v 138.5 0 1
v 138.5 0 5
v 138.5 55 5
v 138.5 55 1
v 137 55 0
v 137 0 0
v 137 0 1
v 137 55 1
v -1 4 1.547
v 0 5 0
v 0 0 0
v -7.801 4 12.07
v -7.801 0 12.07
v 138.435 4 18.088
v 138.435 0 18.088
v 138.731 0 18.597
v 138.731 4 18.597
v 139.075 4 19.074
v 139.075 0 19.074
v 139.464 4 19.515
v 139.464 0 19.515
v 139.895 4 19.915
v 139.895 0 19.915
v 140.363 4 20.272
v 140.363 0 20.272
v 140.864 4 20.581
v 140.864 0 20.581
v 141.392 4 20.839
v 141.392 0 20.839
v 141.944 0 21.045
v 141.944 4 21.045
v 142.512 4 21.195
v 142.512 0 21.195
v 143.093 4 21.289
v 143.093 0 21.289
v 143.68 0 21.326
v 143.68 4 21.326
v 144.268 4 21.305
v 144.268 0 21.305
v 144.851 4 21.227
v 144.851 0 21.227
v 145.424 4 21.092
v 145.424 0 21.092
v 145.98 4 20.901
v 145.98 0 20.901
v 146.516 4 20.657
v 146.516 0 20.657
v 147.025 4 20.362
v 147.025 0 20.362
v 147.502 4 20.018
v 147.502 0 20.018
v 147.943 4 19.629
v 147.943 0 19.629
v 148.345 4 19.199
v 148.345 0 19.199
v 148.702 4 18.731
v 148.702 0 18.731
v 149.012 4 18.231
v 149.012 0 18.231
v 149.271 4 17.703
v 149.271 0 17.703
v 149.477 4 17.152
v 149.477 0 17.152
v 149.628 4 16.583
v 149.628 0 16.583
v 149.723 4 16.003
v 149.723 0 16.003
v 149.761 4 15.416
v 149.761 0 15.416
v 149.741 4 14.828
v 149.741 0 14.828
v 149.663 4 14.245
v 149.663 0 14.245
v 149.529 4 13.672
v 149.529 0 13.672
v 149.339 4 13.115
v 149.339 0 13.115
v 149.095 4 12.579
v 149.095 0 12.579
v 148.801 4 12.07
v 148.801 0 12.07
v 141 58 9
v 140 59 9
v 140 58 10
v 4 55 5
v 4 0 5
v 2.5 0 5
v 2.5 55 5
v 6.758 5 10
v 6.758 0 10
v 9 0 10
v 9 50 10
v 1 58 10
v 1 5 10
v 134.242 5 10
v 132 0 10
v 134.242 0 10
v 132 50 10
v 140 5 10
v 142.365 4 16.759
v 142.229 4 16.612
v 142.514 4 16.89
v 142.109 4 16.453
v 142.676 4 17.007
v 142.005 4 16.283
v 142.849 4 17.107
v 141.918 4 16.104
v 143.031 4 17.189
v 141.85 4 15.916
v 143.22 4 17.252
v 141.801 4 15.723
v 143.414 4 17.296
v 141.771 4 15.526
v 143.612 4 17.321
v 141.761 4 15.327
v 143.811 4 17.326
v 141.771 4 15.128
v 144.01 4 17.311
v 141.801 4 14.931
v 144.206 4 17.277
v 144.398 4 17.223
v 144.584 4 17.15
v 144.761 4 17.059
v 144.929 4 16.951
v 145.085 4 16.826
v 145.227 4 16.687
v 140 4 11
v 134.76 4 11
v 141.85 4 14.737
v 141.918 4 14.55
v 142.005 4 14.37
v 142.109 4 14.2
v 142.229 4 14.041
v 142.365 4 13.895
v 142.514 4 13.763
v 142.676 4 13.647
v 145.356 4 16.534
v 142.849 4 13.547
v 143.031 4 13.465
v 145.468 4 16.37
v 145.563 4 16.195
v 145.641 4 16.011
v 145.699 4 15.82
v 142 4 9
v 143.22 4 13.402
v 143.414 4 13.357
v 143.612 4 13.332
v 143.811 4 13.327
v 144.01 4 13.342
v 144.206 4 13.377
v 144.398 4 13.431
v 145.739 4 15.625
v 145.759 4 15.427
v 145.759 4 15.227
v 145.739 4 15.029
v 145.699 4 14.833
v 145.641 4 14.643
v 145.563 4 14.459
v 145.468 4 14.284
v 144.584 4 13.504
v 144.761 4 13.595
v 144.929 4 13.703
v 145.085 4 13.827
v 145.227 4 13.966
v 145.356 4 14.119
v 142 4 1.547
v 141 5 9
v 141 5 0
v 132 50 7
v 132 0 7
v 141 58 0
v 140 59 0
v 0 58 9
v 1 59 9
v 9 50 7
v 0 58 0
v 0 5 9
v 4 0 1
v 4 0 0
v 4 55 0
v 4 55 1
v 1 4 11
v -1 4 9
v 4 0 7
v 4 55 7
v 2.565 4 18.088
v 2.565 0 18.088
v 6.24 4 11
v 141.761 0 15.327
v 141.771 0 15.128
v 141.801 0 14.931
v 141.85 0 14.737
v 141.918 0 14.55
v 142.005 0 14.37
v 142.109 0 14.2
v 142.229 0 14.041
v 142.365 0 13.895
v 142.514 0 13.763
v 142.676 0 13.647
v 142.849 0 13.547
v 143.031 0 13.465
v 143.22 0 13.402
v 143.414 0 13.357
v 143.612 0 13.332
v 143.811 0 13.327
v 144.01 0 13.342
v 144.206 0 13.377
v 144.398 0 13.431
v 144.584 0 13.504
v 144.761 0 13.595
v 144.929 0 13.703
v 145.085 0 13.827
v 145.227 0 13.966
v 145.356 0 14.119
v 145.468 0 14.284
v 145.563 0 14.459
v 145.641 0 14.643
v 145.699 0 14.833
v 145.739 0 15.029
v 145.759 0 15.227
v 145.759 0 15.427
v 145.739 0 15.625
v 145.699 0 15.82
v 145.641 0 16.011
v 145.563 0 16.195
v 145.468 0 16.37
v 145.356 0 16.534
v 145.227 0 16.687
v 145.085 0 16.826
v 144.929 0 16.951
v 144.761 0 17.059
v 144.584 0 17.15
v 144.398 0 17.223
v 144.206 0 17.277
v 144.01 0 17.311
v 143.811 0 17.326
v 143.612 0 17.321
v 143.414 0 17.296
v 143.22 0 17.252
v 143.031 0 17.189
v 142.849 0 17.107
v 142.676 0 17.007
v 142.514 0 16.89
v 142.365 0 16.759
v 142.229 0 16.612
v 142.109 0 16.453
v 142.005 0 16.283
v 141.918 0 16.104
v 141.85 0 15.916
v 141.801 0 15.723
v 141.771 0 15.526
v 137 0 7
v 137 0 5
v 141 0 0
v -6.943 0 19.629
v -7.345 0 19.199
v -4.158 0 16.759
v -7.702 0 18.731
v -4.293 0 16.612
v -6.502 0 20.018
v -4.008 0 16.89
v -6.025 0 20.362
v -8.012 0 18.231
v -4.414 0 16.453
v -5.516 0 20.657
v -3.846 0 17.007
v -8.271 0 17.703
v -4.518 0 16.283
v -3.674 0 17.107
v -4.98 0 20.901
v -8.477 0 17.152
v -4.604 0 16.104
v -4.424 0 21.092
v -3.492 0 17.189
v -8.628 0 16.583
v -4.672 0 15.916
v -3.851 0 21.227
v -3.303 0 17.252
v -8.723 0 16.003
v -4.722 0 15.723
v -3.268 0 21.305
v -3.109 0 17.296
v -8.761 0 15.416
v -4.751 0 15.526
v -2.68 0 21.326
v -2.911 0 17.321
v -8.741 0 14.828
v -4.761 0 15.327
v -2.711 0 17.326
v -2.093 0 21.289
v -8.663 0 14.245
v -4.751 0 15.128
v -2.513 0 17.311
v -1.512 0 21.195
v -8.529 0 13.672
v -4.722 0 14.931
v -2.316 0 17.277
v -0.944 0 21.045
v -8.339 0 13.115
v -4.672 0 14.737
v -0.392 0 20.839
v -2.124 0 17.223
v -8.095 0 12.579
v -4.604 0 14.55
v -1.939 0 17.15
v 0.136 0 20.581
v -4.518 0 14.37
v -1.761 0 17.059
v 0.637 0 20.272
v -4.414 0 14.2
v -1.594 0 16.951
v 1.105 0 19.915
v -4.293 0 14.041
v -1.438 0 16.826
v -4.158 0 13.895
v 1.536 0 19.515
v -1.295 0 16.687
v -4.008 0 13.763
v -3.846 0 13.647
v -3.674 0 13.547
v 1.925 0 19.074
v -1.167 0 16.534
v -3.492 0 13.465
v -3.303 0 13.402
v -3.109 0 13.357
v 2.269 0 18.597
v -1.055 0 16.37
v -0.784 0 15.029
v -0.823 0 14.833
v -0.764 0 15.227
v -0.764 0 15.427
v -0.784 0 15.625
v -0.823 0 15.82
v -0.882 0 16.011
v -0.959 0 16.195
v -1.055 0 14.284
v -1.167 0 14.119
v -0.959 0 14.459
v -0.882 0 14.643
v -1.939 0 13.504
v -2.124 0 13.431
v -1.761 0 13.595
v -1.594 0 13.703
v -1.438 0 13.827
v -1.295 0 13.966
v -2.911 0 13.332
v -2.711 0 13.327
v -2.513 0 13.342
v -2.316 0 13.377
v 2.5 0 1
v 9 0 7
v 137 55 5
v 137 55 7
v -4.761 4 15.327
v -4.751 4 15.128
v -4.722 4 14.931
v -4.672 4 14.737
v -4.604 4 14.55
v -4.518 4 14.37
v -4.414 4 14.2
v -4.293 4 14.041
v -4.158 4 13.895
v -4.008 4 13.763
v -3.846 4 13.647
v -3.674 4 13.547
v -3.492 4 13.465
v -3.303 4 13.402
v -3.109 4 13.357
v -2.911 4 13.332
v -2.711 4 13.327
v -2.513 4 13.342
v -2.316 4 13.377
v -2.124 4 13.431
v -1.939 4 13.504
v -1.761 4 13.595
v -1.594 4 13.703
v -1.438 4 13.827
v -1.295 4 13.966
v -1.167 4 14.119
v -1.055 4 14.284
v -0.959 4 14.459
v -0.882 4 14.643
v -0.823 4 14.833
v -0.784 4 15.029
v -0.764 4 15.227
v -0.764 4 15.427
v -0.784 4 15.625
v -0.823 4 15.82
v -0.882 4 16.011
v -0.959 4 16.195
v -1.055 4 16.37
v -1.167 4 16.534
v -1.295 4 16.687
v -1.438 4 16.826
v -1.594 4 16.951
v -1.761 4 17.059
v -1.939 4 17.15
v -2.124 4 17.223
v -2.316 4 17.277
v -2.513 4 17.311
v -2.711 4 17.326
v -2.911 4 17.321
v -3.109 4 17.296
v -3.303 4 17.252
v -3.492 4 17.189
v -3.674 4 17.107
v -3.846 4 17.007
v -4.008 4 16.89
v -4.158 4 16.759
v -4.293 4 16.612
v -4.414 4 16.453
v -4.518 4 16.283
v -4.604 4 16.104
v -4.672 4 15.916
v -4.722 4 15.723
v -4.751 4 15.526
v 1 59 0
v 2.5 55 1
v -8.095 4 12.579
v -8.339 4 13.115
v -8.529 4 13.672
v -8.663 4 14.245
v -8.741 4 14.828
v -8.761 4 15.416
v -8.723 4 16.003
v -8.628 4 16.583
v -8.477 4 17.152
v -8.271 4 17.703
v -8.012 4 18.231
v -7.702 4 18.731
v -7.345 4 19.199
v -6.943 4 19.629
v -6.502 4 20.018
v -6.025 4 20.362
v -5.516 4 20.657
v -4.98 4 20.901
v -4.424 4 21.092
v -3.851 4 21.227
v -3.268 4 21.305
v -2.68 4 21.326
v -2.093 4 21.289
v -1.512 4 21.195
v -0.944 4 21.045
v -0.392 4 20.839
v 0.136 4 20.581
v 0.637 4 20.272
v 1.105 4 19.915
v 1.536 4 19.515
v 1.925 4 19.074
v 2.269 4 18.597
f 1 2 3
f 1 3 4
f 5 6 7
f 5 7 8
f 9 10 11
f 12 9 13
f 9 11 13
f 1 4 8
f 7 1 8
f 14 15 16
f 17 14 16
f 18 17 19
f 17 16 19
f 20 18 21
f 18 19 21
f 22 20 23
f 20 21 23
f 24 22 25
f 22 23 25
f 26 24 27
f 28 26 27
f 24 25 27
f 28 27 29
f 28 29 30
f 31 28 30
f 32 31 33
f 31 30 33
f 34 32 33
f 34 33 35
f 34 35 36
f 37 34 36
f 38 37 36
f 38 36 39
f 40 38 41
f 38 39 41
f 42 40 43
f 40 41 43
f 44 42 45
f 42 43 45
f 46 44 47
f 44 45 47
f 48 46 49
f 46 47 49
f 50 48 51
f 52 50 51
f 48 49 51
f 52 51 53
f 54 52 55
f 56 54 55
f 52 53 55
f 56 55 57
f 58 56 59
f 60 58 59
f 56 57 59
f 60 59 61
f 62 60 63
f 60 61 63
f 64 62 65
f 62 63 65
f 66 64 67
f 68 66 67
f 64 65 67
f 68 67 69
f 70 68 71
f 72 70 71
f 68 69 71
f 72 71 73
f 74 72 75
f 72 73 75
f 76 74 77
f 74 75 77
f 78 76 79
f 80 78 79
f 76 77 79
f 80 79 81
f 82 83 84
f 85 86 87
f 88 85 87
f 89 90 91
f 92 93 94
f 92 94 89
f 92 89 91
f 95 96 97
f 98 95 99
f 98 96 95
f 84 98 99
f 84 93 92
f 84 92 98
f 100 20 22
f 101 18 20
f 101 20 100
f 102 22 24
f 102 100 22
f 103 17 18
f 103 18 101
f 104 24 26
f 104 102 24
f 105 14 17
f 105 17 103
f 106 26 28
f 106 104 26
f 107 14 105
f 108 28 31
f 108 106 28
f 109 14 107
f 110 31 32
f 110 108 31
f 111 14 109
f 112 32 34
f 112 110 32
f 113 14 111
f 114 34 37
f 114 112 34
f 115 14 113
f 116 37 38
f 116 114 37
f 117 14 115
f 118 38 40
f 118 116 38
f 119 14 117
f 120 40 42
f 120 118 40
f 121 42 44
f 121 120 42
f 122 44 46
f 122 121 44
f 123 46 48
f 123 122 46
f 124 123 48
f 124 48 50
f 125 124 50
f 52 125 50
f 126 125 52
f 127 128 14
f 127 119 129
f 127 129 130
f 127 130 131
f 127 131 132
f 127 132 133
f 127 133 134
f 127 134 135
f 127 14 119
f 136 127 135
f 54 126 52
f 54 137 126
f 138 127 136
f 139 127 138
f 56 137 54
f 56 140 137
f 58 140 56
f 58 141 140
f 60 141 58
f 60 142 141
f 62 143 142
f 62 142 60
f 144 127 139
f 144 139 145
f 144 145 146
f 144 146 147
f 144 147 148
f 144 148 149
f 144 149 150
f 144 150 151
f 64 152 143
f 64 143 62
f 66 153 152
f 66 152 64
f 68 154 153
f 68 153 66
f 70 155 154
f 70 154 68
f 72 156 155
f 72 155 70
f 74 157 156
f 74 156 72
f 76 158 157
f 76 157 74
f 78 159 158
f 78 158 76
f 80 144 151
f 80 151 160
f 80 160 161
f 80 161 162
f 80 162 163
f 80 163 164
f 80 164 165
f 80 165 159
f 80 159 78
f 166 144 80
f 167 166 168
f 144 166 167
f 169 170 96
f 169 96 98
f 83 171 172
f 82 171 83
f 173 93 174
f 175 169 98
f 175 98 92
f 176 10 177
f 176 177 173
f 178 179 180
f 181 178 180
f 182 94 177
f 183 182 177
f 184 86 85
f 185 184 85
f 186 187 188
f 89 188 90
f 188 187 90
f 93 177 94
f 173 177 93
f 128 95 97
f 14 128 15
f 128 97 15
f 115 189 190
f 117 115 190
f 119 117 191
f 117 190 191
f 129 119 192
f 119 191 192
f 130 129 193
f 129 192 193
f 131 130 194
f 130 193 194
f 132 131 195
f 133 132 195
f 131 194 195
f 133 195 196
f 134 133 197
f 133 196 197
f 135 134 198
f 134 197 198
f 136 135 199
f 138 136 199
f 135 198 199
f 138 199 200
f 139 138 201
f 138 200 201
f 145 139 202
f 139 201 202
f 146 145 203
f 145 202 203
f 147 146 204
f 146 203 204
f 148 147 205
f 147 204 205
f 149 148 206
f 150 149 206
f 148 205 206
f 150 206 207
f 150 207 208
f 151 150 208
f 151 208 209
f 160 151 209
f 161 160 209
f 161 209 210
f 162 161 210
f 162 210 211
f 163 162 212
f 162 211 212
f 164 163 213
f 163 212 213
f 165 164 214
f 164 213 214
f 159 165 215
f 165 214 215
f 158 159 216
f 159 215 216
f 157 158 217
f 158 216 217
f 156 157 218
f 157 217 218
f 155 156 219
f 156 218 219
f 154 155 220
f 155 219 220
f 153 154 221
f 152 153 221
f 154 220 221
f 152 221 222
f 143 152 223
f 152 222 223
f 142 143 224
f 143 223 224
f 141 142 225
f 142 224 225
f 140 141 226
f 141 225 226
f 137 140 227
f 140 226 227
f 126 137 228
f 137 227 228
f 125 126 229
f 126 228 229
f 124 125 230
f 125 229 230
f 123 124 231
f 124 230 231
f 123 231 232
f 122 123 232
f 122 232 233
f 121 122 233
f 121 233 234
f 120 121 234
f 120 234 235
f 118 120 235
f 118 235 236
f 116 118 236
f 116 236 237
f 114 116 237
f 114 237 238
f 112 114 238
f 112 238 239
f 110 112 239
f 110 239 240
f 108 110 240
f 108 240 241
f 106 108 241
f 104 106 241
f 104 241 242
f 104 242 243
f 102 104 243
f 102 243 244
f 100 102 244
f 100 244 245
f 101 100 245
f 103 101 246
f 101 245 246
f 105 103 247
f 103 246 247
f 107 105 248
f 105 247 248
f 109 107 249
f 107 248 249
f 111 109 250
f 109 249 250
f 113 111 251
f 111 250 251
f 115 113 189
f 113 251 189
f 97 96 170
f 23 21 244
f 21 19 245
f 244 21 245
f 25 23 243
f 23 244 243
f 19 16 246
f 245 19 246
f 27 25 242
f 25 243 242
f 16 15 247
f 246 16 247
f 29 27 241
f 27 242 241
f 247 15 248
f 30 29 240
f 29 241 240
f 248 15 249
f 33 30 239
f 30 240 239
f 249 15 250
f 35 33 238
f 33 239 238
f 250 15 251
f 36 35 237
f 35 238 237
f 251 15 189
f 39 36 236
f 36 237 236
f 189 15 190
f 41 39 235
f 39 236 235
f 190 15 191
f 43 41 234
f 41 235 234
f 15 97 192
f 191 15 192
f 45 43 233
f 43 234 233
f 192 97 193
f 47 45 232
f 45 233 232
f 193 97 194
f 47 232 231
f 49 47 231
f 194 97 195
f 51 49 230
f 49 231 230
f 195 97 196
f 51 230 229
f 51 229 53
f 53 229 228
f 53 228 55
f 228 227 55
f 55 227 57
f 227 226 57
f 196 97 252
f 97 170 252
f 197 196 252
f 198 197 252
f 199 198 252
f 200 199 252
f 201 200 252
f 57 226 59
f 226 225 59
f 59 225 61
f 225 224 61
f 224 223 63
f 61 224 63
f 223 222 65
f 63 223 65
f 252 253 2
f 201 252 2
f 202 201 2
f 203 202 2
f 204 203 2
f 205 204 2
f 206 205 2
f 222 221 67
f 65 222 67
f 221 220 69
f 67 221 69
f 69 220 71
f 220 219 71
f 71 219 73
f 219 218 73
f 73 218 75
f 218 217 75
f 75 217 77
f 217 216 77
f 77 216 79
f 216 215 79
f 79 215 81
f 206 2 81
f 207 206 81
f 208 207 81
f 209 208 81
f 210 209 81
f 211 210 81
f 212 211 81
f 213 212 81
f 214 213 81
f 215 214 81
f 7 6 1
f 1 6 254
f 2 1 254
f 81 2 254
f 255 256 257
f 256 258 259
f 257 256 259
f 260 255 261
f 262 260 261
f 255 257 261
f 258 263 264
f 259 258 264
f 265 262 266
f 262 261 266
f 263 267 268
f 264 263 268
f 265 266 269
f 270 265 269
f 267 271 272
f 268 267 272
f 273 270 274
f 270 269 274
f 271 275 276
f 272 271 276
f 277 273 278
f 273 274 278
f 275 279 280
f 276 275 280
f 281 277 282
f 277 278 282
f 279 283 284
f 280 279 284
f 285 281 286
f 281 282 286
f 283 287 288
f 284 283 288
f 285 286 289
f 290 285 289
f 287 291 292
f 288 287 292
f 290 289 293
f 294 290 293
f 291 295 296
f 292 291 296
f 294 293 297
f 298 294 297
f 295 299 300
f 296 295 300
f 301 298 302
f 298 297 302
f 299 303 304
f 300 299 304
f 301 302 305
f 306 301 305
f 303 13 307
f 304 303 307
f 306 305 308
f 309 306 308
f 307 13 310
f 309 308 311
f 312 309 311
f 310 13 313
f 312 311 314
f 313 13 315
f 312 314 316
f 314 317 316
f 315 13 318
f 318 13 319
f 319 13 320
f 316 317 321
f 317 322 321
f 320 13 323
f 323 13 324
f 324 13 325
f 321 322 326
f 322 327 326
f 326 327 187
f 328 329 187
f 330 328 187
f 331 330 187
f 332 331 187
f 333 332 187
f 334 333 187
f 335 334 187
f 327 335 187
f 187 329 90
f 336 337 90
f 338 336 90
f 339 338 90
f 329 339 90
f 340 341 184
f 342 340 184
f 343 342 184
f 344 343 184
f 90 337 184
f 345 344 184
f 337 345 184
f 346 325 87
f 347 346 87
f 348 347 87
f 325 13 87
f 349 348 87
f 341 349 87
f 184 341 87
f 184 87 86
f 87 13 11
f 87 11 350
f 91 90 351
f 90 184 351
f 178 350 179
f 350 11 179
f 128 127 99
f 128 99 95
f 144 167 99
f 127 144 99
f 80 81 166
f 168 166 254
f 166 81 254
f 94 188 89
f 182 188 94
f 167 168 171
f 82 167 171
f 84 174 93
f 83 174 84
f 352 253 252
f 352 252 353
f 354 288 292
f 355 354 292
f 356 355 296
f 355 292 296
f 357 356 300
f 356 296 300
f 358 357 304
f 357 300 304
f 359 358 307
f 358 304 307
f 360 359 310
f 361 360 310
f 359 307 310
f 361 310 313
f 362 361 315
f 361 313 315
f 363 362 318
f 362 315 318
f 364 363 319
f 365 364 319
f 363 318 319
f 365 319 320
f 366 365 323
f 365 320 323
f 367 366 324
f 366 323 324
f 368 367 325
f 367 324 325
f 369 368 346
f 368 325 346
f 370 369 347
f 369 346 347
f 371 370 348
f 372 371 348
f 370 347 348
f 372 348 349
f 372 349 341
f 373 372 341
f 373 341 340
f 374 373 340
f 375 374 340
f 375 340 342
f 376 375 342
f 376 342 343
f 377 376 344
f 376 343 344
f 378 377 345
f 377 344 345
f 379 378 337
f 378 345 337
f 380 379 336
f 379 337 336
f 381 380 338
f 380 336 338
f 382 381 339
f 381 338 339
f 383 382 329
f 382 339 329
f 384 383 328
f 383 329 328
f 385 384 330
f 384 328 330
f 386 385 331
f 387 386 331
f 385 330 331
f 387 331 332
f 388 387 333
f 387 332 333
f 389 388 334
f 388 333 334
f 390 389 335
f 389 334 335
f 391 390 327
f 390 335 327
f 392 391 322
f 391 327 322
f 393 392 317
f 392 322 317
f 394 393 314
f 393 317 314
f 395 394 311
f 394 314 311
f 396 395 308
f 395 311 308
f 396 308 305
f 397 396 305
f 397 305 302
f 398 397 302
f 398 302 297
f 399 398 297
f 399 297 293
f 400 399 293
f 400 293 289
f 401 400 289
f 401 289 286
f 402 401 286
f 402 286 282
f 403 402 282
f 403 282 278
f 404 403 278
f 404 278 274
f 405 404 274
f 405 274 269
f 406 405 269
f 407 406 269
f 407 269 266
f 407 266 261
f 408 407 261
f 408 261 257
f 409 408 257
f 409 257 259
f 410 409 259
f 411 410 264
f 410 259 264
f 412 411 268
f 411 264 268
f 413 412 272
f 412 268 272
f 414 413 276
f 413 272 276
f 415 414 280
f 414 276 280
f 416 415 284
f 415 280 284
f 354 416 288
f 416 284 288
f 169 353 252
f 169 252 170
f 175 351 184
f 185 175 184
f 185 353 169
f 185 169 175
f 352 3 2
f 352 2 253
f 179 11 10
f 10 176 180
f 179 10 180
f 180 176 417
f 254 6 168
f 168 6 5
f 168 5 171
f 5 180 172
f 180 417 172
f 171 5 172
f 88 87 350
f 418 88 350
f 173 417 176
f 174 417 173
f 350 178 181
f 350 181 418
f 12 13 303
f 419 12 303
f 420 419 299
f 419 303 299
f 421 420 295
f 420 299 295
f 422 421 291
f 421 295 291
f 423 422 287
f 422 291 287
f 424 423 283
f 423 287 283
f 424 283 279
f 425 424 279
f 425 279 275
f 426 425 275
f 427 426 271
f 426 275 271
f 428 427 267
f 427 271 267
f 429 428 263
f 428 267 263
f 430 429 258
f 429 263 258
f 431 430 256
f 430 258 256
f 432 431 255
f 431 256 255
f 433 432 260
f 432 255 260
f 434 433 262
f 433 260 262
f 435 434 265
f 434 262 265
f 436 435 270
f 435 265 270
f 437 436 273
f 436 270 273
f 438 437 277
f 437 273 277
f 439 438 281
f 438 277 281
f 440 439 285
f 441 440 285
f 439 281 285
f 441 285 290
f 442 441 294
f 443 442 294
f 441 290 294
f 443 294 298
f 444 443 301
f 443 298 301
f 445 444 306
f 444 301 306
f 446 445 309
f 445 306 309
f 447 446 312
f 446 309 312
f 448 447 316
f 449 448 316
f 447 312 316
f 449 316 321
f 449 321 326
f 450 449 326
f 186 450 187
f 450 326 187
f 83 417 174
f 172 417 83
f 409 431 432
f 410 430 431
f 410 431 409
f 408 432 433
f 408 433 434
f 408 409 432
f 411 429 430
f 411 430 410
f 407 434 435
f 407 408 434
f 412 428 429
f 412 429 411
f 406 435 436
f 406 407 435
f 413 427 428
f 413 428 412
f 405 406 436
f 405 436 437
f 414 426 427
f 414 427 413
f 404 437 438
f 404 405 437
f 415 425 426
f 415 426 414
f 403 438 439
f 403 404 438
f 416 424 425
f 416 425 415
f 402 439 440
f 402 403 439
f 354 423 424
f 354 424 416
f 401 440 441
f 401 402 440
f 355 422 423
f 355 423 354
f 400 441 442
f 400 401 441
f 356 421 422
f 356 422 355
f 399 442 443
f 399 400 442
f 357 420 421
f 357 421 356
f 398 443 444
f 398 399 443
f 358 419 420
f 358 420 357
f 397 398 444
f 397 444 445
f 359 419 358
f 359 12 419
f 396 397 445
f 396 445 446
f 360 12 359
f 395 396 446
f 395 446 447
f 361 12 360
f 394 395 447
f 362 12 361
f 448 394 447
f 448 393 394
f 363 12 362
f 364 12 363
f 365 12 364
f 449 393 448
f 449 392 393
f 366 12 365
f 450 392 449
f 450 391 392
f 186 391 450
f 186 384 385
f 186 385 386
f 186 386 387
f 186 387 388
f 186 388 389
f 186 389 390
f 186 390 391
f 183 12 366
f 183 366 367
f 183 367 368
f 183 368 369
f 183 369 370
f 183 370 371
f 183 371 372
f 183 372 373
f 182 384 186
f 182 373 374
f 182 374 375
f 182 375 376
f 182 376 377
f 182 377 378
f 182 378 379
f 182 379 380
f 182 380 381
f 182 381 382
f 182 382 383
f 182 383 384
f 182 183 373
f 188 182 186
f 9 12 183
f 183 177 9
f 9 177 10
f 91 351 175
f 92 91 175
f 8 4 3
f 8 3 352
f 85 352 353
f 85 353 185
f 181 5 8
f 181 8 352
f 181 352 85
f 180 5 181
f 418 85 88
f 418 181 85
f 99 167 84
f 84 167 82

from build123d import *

# Parameters (mm, degrees)
SKETCH1_W           = 141
SKETCH1_H           = 59
BOSS_EXTRUDE1_DEPTH = 10
SKETCH2_W           = 133
SKETCH2_H           = 55
CUT_EXTRUDE1_DEPTH  = 7
SKETCH3_W           = 123
SKETCH3_H           = 50
CUT_EXTRUDE2_DEPTH  = 7
SKETCH4_W           = 1.5
SKETCH4_H           = 4
CUT_EXTRUDE3_DEPTH  = 55
SKETCH5_R           = 2
BOSS_EXTRUDE2_DEPTH = 4
CHAMFER1_SIZE       = 1


with BuildPart() as part:
    # Sketch1 → Boss-Extrude1 (new body)
    with BuildSketch(Plane.XY):
        with Locations((70.5, 29.5)):
            Rectangle(SKETCH1_W, SKETCH1_H)
    extrude(amount=BOSS_EXTRUDE1_DEPTH)

    # Sketch2 → Cut-Extrude1 (cut)
    with BuildSketch(Plane(origin=(0, 0, 0), x_dir=(-1, 0, 0), z_dir=(0, 0, -1))):
        with Locations((-70.5, 27.5)):
            Rectangle(SKETCH2_W, SKETCH2_H)
    extrude(amount=-CUT_EXTRUDE1_DEPTH, mode=Mode.SUBTRACT)

    # Sketch3 → Cut-Extrude2 (cut)
    with BuildSketch(Plane(origin=(0, 0, 7), x_dir=(-1, 0, 0), z_dir=(0, 0, -1))):
        with Locations((-70.5, 25)):
            Rectangle(SKETCH3_W, SKETCH3_H)
    extrude(amount=-CUT_EXTRUDE2_DEPTH, mode=Mode.SUBTRACT)

    # Sketch4 → Cut-Extrude3 (cut)
    with BuildSketch(Plane(origin=(0, 0, 0), x_dir=(-1, 0, 0), z_dir=(0, -1, 0))):
        with Locations((-3.25, -3)):
            Rectangle(SKETCH4_W, SKETCH4_H)
        with Locations((-137.75, -3)):
            Rectangle(SKETCH4_W, SKETCH4_H)
    extrude(amount=-CUT_EXTRUDE3_DEPTH, mode=Mode.SUBTRACT)

    # Sketch5 → Boss-Extrude2 (add)
    with BuildSketch(Plane(origin=(0, 0, 0), x_dir=(-1, 0, 0), z_dir=(0, -1, 0))):
        with BuildLine():
            Line((-2.565492231, -18.088154896), (-6.758248996, -10))
            Line((-6.758248996, -10), (0, -10))
            Line((0, -10), (0, 0))
            Line((0, 0), (7.800562775, -12.070115644))
            ThreePointArc((7.800562775, -12.070115644), (5.773784886, -20.515765997), (-2.565492231, -18.088154896))
        make_face()
        with Locations((2.761331332, -15.326823563)):
            Circle(SKETCH5_R, mode=Mode.SUBTRACT)
        with BuildLine():
            Line((-141, -10), (-134.241751004, -10))
            Line((-134.241751004, -10), (-138.434507769, -18.088154896))
            ThreePointArc((-138.434507769, -18.088154896), (-146.773784886, -20.515765997), (-148.800562775, -12.070115644))
            Line((-148.800562775, -12.070115644), (-141, 0))
            Line((-141, 0), (-141, -10))
        make_face()
        with Locations((-143.761331332, -15.326823563)):
            Circle(SKETCH5_R, mode=Mode.SUBTRACT)
    extrude(amount=-BOSS_EXTRUDE2_DEPTH)

    # Chamfer1
    chamfer1_edges = [part.edges().sort_by_distance(p)[0] for p in [
        (70.5, 59, 10),
        (0, 31.5, 10),
        (0, 59, 5),
        (141, 59, 5),
        (3.379124498, 4, 10),
        (0, 4, 5),
        (141, 31.5, 10),
        (141, 4, 5),
        (137.620875502, 4, 10),
    ]]
    chamfer(chamfer1_edges, length=CHAMFER1_SIZE)


solid = part.part
